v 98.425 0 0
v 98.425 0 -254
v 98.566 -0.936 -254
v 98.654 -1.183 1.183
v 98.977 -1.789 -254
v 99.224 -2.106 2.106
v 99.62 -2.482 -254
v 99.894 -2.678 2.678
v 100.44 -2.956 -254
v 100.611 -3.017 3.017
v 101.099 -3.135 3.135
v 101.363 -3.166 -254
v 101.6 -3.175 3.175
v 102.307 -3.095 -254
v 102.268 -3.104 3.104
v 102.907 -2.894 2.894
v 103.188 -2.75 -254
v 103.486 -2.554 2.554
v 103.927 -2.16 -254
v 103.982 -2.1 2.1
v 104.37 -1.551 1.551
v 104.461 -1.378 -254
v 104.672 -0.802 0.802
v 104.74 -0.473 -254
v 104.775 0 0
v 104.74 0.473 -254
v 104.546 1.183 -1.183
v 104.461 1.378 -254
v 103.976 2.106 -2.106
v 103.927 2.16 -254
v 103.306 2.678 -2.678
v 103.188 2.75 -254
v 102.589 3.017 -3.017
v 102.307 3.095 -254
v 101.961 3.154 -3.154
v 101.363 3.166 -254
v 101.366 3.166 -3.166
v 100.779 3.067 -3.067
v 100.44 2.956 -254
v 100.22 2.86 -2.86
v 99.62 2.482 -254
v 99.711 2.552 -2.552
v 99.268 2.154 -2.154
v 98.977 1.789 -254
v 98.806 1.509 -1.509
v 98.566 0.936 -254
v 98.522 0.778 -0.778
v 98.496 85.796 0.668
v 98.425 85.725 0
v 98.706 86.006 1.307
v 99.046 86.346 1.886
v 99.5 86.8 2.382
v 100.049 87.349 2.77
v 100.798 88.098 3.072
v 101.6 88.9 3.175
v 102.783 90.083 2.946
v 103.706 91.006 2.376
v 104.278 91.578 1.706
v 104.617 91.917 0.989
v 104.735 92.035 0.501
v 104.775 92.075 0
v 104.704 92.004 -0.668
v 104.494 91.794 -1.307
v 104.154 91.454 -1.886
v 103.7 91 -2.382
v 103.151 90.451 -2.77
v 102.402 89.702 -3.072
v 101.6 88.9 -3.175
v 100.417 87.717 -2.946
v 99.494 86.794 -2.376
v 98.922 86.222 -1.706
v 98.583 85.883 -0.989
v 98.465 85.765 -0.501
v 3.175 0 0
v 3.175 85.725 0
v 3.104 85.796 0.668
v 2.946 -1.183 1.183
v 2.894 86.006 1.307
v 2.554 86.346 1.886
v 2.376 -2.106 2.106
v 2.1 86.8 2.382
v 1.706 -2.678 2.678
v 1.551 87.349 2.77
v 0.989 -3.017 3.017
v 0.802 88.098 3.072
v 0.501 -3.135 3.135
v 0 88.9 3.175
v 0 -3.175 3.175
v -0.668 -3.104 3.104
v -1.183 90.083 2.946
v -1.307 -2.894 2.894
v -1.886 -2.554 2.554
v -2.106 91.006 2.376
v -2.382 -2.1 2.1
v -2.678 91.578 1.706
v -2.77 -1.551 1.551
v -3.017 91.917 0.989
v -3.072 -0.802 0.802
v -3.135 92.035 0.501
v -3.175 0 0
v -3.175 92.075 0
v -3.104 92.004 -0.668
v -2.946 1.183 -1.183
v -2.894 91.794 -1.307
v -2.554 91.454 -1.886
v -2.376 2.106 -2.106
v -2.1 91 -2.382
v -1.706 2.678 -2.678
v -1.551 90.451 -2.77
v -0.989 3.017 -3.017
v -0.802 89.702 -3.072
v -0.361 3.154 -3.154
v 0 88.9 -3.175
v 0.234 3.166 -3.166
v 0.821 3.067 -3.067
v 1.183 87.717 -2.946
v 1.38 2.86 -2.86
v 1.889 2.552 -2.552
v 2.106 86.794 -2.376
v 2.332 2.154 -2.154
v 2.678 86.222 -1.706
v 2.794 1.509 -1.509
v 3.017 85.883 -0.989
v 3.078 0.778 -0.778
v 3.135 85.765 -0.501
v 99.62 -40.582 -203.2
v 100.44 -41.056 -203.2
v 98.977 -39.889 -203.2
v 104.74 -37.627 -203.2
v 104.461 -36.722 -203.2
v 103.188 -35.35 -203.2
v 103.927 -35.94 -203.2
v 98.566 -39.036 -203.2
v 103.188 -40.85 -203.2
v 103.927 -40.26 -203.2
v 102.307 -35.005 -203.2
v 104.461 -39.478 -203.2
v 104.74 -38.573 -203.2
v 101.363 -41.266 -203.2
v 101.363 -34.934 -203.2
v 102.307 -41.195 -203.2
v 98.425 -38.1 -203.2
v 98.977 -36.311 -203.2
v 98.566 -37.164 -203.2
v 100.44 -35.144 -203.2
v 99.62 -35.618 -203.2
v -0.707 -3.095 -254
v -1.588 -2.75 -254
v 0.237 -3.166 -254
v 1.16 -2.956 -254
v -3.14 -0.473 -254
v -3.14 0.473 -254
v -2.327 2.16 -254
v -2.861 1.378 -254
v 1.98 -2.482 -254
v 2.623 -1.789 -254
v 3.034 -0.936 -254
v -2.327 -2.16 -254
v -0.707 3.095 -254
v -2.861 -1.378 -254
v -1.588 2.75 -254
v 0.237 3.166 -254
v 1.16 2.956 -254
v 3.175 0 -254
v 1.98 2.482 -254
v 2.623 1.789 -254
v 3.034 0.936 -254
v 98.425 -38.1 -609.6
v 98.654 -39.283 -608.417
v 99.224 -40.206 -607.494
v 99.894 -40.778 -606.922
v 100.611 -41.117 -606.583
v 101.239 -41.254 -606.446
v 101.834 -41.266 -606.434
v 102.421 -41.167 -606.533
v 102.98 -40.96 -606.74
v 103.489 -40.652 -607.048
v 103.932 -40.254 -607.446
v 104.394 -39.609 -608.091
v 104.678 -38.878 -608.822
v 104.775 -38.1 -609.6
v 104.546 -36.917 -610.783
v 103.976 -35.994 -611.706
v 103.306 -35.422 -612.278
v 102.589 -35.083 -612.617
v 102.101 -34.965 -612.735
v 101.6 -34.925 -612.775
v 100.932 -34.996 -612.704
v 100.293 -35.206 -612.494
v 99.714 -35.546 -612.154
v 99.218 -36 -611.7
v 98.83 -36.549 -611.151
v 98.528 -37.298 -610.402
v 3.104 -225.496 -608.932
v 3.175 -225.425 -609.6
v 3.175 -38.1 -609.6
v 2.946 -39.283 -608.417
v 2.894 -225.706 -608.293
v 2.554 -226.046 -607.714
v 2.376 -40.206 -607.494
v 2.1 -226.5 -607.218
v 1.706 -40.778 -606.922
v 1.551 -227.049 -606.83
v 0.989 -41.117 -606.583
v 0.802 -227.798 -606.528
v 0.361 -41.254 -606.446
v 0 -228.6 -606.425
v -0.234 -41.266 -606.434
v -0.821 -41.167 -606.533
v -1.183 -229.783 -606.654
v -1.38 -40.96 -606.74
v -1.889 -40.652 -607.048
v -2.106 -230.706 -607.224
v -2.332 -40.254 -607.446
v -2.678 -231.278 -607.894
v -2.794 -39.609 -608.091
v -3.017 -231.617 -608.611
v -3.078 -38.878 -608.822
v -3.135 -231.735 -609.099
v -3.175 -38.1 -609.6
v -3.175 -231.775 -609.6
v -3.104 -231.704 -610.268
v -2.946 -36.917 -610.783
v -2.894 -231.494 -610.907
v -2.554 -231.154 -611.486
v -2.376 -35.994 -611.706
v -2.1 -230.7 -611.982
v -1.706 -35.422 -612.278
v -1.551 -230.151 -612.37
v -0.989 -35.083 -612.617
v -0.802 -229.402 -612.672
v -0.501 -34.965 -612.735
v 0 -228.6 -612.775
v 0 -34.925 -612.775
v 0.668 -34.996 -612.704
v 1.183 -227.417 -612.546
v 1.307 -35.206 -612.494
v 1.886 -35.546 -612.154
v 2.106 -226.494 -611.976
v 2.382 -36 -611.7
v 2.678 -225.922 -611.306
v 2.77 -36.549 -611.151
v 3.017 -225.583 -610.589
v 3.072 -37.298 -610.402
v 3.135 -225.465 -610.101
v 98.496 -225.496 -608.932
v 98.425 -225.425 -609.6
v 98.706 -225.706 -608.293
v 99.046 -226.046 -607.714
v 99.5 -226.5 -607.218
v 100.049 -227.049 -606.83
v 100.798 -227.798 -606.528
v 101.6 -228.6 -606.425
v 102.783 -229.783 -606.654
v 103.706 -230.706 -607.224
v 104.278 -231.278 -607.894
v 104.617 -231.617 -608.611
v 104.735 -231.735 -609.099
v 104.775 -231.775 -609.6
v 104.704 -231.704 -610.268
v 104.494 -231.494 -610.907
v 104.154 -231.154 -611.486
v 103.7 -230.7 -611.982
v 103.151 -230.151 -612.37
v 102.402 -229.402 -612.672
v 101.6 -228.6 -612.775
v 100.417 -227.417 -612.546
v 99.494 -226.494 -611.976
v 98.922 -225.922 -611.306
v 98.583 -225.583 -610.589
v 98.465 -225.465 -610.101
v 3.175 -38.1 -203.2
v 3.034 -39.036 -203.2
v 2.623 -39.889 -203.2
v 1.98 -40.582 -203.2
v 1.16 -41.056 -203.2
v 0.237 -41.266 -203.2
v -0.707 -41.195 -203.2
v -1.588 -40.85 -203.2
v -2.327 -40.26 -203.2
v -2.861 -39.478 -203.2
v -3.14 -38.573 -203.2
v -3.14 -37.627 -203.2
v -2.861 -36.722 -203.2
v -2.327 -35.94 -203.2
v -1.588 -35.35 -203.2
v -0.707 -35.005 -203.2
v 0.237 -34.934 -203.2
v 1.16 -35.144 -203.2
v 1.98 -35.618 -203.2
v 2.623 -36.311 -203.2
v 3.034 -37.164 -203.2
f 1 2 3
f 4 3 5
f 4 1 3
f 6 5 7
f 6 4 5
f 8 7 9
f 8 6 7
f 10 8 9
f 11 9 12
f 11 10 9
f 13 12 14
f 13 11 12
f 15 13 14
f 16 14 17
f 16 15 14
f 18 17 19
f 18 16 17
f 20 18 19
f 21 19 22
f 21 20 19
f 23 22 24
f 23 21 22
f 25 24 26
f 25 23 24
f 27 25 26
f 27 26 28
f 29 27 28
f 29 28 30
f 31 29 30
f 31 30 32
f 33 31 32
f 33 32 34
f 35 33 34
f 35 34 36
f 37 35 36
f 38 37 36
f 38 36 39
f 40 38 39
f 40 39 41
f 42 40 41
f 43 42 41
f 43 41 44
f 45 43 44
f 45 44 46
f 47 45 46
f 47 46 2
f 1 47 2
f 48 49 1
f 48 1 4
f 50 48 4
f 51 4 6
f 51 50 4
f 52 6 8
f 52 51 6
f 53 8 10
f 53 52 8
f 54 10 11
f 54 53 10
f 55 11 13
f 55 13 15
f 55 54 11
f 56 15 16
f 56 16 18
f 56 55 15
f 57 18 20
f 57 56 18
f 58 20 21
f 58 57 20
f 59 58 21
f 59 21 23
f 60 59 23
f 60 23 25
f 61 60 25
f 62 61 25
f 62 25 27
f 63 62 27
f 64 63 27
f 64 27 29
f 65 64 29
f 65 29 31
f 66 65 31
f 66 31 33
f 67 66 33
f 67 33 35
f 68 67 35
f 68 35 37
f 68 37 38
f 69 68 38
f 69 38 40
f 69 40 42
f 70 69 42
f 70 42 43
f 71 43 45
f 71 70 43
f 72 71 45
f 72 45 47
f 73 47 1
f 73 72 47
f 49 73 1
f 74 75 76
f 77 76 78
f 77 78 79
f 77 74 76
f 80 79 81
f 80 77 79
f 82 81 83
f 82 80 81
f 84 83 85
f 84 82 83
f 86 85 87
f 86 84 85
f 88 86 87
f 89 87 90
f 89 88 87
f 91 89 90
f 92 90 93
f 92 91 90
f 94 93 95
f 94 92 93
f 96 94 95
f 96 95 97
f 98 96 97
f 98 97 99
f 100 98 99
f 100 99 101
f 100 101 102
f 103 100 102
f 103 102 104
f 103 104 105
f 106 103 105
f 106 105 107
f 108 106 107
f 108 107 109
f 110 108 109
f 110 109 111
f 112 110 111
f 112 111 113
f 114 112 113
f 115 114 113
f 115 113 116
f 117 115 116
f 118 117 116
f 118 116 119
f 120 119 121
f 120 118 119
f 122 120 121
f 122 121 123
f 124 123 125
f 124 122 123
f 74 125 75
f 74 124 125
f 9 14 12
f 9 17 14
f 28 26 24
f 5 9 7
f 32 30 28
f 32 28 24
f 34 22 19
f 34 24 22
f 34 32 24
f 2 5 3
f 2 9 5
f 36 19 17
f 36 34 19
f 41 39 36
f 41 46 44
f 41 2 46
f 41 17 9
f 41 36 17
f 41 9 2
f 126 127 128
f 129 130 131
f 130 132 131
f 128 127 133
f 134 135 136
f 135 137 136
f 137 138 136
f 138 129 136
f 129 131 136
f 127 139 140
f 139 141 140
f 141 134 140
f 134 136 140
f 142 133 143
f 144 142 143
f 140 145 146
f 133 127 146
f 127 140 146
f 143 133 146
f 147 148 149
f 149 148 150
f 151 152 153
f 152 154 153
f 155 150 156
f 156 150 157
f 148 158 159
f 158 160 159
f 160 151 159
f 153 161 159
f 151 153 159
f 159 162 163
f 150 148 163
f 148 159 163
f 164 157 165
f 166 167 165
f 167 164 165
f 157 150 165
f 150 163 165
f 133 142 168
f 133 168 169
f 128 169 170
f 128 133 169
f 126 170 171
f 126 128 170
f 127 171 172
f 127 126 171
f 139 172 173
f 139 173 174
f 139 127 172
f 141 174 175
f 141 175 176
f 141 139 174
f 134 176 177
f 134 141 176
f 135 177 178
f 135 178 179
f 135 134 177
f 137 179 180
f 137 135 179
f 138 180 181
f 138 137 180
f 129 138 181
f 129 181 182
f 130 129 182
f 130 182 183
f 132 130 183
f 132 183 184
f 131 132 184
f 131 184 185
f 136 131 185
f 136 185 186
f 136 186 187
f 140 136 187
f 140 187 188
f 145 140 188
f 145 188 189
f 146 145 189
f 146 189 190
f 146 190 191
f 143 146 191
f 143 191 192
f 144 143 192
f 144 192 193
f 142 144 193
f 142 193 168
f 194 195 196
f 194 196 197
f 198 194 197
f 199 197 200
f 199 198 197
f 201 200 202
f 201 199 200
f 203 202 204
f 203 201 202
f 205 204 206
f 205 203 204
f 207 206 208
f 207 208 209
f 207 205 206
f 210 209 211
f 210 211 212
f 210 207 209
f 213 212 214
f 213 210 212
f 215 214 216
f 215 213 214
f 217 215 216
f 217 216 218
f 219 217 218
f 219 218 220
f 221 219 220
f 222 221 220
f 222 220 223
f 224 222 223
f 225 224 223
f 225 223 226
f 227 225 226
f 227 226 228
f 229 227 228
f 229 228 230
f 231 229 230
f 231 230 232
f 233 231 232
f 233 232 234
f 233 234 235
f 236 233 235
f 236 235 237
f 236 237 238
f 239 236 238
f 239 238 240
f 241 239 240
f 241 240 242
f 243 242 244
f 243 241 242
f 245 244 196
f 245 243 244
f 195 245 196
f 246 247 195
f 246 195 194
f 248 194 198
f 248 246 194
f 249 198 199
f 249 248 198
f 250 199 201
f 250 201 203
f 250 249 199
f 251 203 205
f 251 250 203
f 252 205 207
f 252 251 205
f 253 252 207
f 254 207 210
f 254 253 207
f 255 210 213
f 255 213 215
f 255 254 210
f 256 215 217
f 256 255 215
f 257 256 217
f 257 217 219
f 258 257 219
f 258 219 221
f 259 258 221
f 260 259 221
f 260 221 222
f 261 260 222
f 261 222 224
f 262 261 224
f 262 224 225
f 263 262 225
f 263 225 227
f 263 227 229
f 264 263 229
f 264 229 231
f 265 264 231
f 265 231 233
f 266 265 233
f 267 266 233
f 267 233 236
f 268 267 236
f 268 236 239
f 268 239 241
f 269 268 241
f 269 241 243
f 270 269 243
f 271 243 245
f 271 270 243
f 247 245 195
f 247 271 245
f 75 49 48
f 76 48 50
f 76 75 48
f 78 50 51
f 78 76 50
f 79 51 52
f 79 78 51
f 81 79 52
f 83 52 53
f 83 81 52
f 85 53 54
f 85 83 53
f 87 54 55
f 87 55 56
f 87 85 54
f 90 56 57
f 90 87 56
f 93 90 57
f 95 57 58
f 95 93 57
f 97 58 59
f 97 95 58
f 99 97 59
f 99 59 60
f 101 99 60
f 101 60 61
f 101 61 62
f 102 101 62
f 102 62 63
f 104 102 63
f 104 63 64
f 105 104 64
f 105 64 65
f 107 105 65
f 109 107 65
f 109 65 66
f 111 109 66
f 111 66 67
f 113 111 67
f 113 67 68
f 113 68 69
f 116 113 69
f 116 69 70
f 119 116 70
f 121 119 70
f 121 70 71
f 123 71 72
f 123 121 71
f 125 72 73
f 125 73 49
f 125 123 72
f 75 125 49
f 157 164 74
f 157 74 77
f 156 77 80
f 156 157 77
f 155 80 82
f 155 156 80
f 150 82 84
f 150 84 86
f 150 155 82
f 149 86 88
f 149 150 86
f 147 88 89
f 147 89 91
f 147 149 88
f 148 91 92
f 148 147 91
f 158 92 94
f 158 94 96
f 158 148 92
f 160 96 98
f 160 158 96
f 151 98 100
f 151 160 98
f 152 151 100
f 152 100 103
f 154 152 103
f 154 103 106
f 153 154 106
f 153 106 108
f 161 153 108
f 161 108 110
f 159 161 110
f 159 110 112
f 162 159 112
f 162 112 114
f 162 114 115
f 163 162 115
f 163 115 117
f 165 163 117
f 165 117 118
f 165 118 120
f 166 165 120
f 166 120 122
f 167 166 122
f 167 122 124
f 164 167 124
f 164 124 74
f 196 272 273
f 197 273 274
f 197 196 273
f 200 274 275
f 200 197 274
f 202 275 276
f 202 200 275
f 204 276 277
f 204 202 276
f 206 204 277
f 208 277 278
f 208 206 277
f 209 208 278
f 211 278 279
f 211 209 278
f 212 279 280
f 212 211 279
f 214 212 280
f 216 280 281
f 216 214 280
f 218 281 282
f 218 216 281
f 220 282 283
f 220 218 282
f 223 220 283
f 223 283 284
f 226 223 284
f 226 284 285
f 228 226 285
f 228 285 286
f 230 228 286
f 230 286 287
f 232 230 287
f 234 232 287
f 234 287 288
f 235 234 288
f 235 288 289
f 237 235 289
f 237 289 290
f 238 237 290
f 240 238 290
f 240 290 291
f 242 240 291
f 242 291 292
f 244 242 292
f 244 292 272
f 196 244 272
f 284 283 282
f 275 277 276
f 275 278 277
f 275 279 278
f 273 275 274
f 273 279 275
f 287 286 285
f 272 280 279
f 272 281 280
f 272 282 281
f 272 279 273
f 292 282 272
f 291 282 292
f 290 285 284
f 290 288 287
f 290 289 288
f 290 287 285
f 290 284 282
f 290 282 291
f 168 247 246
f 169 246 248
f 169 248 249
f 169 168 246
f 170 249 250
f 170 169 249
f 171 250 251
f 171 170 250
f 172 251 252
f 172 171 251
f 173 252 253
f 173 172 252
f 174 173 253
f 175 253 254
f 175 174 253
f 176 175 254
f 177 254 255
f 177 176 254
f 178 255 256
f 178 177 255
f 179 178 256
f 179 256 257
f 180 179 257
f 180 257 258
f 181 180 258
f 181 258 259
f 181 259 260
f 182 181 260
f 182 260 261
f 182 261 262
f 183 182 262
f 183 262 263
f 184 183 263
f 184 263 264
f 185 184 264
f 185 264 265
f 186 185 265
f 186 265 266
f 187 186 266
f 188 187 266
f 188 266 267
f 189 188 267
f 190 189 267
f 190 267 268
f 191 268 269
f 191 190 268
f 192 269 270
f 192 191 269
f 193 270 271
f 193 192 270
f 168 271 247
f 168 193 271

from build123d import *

# Parameters (mm, degrees)
F3_R  = 3.175
F12_R = 3.175


with BuildPart() as f4:
    # F4: sweep along a path in F1, F0, F1
    with BuildLine(Plane.XZ) as f4_path:
        Line((0, 0), (0, -254))
    with BuildLine(Plane.XY) as f4_path_2:
        Line((0, 0), (0, 88.9))
        Line((0, 88.9), (101.6, 88.9))
        Line((101.6, 88.9), (101.6, 0))
    with BuildLine(Plane.XZ) as f4_path_3:
        Line((101.6, 0), (101.6, -254))
    # F3 (on offset) → F4 (sweep)
    with BuildSketch(Plane.XY.offset(-254)):
        Circle(F3_R)
    sweep(path=f4_path.line + f4_path_2.line + f4_path_3.line, transition=Transition.RIGHT)


with BuildPart() as f13:
    # F13: sweep along a path in F8, F10, F8
    with BuildLine(Plane.XZ.offset(38.1)) as f13_path:
        Line((0, -203.2), (0, -609.6))
    with BuildLine(Plane.XY.offset(-609.6)) as f13_path_2:
        Line((0, -38.1), (0, -228.6))
        Line((0, -228.6), (101.6, -228.6))
        Line((101.6, -228.6), (101.6, -38.1))
    with BuildLine(Plane.XZ.offset(38.1)) as f13_path_3:
        Line((101.6, -203.2), (101.6, -609.6))
    # F12 (on offset) → F13 (sweep)
    with BuildSketch(Plane.XY.offset(-203.2)):
        with Locations((0, -38.1)):
            Circle(F12_R)
    sweep(path=f13_path.line + f13_path_2.line + f13_path_3.line, transition=Transition.RIGHT)


solid = Compound([f4.part, f13.part])
